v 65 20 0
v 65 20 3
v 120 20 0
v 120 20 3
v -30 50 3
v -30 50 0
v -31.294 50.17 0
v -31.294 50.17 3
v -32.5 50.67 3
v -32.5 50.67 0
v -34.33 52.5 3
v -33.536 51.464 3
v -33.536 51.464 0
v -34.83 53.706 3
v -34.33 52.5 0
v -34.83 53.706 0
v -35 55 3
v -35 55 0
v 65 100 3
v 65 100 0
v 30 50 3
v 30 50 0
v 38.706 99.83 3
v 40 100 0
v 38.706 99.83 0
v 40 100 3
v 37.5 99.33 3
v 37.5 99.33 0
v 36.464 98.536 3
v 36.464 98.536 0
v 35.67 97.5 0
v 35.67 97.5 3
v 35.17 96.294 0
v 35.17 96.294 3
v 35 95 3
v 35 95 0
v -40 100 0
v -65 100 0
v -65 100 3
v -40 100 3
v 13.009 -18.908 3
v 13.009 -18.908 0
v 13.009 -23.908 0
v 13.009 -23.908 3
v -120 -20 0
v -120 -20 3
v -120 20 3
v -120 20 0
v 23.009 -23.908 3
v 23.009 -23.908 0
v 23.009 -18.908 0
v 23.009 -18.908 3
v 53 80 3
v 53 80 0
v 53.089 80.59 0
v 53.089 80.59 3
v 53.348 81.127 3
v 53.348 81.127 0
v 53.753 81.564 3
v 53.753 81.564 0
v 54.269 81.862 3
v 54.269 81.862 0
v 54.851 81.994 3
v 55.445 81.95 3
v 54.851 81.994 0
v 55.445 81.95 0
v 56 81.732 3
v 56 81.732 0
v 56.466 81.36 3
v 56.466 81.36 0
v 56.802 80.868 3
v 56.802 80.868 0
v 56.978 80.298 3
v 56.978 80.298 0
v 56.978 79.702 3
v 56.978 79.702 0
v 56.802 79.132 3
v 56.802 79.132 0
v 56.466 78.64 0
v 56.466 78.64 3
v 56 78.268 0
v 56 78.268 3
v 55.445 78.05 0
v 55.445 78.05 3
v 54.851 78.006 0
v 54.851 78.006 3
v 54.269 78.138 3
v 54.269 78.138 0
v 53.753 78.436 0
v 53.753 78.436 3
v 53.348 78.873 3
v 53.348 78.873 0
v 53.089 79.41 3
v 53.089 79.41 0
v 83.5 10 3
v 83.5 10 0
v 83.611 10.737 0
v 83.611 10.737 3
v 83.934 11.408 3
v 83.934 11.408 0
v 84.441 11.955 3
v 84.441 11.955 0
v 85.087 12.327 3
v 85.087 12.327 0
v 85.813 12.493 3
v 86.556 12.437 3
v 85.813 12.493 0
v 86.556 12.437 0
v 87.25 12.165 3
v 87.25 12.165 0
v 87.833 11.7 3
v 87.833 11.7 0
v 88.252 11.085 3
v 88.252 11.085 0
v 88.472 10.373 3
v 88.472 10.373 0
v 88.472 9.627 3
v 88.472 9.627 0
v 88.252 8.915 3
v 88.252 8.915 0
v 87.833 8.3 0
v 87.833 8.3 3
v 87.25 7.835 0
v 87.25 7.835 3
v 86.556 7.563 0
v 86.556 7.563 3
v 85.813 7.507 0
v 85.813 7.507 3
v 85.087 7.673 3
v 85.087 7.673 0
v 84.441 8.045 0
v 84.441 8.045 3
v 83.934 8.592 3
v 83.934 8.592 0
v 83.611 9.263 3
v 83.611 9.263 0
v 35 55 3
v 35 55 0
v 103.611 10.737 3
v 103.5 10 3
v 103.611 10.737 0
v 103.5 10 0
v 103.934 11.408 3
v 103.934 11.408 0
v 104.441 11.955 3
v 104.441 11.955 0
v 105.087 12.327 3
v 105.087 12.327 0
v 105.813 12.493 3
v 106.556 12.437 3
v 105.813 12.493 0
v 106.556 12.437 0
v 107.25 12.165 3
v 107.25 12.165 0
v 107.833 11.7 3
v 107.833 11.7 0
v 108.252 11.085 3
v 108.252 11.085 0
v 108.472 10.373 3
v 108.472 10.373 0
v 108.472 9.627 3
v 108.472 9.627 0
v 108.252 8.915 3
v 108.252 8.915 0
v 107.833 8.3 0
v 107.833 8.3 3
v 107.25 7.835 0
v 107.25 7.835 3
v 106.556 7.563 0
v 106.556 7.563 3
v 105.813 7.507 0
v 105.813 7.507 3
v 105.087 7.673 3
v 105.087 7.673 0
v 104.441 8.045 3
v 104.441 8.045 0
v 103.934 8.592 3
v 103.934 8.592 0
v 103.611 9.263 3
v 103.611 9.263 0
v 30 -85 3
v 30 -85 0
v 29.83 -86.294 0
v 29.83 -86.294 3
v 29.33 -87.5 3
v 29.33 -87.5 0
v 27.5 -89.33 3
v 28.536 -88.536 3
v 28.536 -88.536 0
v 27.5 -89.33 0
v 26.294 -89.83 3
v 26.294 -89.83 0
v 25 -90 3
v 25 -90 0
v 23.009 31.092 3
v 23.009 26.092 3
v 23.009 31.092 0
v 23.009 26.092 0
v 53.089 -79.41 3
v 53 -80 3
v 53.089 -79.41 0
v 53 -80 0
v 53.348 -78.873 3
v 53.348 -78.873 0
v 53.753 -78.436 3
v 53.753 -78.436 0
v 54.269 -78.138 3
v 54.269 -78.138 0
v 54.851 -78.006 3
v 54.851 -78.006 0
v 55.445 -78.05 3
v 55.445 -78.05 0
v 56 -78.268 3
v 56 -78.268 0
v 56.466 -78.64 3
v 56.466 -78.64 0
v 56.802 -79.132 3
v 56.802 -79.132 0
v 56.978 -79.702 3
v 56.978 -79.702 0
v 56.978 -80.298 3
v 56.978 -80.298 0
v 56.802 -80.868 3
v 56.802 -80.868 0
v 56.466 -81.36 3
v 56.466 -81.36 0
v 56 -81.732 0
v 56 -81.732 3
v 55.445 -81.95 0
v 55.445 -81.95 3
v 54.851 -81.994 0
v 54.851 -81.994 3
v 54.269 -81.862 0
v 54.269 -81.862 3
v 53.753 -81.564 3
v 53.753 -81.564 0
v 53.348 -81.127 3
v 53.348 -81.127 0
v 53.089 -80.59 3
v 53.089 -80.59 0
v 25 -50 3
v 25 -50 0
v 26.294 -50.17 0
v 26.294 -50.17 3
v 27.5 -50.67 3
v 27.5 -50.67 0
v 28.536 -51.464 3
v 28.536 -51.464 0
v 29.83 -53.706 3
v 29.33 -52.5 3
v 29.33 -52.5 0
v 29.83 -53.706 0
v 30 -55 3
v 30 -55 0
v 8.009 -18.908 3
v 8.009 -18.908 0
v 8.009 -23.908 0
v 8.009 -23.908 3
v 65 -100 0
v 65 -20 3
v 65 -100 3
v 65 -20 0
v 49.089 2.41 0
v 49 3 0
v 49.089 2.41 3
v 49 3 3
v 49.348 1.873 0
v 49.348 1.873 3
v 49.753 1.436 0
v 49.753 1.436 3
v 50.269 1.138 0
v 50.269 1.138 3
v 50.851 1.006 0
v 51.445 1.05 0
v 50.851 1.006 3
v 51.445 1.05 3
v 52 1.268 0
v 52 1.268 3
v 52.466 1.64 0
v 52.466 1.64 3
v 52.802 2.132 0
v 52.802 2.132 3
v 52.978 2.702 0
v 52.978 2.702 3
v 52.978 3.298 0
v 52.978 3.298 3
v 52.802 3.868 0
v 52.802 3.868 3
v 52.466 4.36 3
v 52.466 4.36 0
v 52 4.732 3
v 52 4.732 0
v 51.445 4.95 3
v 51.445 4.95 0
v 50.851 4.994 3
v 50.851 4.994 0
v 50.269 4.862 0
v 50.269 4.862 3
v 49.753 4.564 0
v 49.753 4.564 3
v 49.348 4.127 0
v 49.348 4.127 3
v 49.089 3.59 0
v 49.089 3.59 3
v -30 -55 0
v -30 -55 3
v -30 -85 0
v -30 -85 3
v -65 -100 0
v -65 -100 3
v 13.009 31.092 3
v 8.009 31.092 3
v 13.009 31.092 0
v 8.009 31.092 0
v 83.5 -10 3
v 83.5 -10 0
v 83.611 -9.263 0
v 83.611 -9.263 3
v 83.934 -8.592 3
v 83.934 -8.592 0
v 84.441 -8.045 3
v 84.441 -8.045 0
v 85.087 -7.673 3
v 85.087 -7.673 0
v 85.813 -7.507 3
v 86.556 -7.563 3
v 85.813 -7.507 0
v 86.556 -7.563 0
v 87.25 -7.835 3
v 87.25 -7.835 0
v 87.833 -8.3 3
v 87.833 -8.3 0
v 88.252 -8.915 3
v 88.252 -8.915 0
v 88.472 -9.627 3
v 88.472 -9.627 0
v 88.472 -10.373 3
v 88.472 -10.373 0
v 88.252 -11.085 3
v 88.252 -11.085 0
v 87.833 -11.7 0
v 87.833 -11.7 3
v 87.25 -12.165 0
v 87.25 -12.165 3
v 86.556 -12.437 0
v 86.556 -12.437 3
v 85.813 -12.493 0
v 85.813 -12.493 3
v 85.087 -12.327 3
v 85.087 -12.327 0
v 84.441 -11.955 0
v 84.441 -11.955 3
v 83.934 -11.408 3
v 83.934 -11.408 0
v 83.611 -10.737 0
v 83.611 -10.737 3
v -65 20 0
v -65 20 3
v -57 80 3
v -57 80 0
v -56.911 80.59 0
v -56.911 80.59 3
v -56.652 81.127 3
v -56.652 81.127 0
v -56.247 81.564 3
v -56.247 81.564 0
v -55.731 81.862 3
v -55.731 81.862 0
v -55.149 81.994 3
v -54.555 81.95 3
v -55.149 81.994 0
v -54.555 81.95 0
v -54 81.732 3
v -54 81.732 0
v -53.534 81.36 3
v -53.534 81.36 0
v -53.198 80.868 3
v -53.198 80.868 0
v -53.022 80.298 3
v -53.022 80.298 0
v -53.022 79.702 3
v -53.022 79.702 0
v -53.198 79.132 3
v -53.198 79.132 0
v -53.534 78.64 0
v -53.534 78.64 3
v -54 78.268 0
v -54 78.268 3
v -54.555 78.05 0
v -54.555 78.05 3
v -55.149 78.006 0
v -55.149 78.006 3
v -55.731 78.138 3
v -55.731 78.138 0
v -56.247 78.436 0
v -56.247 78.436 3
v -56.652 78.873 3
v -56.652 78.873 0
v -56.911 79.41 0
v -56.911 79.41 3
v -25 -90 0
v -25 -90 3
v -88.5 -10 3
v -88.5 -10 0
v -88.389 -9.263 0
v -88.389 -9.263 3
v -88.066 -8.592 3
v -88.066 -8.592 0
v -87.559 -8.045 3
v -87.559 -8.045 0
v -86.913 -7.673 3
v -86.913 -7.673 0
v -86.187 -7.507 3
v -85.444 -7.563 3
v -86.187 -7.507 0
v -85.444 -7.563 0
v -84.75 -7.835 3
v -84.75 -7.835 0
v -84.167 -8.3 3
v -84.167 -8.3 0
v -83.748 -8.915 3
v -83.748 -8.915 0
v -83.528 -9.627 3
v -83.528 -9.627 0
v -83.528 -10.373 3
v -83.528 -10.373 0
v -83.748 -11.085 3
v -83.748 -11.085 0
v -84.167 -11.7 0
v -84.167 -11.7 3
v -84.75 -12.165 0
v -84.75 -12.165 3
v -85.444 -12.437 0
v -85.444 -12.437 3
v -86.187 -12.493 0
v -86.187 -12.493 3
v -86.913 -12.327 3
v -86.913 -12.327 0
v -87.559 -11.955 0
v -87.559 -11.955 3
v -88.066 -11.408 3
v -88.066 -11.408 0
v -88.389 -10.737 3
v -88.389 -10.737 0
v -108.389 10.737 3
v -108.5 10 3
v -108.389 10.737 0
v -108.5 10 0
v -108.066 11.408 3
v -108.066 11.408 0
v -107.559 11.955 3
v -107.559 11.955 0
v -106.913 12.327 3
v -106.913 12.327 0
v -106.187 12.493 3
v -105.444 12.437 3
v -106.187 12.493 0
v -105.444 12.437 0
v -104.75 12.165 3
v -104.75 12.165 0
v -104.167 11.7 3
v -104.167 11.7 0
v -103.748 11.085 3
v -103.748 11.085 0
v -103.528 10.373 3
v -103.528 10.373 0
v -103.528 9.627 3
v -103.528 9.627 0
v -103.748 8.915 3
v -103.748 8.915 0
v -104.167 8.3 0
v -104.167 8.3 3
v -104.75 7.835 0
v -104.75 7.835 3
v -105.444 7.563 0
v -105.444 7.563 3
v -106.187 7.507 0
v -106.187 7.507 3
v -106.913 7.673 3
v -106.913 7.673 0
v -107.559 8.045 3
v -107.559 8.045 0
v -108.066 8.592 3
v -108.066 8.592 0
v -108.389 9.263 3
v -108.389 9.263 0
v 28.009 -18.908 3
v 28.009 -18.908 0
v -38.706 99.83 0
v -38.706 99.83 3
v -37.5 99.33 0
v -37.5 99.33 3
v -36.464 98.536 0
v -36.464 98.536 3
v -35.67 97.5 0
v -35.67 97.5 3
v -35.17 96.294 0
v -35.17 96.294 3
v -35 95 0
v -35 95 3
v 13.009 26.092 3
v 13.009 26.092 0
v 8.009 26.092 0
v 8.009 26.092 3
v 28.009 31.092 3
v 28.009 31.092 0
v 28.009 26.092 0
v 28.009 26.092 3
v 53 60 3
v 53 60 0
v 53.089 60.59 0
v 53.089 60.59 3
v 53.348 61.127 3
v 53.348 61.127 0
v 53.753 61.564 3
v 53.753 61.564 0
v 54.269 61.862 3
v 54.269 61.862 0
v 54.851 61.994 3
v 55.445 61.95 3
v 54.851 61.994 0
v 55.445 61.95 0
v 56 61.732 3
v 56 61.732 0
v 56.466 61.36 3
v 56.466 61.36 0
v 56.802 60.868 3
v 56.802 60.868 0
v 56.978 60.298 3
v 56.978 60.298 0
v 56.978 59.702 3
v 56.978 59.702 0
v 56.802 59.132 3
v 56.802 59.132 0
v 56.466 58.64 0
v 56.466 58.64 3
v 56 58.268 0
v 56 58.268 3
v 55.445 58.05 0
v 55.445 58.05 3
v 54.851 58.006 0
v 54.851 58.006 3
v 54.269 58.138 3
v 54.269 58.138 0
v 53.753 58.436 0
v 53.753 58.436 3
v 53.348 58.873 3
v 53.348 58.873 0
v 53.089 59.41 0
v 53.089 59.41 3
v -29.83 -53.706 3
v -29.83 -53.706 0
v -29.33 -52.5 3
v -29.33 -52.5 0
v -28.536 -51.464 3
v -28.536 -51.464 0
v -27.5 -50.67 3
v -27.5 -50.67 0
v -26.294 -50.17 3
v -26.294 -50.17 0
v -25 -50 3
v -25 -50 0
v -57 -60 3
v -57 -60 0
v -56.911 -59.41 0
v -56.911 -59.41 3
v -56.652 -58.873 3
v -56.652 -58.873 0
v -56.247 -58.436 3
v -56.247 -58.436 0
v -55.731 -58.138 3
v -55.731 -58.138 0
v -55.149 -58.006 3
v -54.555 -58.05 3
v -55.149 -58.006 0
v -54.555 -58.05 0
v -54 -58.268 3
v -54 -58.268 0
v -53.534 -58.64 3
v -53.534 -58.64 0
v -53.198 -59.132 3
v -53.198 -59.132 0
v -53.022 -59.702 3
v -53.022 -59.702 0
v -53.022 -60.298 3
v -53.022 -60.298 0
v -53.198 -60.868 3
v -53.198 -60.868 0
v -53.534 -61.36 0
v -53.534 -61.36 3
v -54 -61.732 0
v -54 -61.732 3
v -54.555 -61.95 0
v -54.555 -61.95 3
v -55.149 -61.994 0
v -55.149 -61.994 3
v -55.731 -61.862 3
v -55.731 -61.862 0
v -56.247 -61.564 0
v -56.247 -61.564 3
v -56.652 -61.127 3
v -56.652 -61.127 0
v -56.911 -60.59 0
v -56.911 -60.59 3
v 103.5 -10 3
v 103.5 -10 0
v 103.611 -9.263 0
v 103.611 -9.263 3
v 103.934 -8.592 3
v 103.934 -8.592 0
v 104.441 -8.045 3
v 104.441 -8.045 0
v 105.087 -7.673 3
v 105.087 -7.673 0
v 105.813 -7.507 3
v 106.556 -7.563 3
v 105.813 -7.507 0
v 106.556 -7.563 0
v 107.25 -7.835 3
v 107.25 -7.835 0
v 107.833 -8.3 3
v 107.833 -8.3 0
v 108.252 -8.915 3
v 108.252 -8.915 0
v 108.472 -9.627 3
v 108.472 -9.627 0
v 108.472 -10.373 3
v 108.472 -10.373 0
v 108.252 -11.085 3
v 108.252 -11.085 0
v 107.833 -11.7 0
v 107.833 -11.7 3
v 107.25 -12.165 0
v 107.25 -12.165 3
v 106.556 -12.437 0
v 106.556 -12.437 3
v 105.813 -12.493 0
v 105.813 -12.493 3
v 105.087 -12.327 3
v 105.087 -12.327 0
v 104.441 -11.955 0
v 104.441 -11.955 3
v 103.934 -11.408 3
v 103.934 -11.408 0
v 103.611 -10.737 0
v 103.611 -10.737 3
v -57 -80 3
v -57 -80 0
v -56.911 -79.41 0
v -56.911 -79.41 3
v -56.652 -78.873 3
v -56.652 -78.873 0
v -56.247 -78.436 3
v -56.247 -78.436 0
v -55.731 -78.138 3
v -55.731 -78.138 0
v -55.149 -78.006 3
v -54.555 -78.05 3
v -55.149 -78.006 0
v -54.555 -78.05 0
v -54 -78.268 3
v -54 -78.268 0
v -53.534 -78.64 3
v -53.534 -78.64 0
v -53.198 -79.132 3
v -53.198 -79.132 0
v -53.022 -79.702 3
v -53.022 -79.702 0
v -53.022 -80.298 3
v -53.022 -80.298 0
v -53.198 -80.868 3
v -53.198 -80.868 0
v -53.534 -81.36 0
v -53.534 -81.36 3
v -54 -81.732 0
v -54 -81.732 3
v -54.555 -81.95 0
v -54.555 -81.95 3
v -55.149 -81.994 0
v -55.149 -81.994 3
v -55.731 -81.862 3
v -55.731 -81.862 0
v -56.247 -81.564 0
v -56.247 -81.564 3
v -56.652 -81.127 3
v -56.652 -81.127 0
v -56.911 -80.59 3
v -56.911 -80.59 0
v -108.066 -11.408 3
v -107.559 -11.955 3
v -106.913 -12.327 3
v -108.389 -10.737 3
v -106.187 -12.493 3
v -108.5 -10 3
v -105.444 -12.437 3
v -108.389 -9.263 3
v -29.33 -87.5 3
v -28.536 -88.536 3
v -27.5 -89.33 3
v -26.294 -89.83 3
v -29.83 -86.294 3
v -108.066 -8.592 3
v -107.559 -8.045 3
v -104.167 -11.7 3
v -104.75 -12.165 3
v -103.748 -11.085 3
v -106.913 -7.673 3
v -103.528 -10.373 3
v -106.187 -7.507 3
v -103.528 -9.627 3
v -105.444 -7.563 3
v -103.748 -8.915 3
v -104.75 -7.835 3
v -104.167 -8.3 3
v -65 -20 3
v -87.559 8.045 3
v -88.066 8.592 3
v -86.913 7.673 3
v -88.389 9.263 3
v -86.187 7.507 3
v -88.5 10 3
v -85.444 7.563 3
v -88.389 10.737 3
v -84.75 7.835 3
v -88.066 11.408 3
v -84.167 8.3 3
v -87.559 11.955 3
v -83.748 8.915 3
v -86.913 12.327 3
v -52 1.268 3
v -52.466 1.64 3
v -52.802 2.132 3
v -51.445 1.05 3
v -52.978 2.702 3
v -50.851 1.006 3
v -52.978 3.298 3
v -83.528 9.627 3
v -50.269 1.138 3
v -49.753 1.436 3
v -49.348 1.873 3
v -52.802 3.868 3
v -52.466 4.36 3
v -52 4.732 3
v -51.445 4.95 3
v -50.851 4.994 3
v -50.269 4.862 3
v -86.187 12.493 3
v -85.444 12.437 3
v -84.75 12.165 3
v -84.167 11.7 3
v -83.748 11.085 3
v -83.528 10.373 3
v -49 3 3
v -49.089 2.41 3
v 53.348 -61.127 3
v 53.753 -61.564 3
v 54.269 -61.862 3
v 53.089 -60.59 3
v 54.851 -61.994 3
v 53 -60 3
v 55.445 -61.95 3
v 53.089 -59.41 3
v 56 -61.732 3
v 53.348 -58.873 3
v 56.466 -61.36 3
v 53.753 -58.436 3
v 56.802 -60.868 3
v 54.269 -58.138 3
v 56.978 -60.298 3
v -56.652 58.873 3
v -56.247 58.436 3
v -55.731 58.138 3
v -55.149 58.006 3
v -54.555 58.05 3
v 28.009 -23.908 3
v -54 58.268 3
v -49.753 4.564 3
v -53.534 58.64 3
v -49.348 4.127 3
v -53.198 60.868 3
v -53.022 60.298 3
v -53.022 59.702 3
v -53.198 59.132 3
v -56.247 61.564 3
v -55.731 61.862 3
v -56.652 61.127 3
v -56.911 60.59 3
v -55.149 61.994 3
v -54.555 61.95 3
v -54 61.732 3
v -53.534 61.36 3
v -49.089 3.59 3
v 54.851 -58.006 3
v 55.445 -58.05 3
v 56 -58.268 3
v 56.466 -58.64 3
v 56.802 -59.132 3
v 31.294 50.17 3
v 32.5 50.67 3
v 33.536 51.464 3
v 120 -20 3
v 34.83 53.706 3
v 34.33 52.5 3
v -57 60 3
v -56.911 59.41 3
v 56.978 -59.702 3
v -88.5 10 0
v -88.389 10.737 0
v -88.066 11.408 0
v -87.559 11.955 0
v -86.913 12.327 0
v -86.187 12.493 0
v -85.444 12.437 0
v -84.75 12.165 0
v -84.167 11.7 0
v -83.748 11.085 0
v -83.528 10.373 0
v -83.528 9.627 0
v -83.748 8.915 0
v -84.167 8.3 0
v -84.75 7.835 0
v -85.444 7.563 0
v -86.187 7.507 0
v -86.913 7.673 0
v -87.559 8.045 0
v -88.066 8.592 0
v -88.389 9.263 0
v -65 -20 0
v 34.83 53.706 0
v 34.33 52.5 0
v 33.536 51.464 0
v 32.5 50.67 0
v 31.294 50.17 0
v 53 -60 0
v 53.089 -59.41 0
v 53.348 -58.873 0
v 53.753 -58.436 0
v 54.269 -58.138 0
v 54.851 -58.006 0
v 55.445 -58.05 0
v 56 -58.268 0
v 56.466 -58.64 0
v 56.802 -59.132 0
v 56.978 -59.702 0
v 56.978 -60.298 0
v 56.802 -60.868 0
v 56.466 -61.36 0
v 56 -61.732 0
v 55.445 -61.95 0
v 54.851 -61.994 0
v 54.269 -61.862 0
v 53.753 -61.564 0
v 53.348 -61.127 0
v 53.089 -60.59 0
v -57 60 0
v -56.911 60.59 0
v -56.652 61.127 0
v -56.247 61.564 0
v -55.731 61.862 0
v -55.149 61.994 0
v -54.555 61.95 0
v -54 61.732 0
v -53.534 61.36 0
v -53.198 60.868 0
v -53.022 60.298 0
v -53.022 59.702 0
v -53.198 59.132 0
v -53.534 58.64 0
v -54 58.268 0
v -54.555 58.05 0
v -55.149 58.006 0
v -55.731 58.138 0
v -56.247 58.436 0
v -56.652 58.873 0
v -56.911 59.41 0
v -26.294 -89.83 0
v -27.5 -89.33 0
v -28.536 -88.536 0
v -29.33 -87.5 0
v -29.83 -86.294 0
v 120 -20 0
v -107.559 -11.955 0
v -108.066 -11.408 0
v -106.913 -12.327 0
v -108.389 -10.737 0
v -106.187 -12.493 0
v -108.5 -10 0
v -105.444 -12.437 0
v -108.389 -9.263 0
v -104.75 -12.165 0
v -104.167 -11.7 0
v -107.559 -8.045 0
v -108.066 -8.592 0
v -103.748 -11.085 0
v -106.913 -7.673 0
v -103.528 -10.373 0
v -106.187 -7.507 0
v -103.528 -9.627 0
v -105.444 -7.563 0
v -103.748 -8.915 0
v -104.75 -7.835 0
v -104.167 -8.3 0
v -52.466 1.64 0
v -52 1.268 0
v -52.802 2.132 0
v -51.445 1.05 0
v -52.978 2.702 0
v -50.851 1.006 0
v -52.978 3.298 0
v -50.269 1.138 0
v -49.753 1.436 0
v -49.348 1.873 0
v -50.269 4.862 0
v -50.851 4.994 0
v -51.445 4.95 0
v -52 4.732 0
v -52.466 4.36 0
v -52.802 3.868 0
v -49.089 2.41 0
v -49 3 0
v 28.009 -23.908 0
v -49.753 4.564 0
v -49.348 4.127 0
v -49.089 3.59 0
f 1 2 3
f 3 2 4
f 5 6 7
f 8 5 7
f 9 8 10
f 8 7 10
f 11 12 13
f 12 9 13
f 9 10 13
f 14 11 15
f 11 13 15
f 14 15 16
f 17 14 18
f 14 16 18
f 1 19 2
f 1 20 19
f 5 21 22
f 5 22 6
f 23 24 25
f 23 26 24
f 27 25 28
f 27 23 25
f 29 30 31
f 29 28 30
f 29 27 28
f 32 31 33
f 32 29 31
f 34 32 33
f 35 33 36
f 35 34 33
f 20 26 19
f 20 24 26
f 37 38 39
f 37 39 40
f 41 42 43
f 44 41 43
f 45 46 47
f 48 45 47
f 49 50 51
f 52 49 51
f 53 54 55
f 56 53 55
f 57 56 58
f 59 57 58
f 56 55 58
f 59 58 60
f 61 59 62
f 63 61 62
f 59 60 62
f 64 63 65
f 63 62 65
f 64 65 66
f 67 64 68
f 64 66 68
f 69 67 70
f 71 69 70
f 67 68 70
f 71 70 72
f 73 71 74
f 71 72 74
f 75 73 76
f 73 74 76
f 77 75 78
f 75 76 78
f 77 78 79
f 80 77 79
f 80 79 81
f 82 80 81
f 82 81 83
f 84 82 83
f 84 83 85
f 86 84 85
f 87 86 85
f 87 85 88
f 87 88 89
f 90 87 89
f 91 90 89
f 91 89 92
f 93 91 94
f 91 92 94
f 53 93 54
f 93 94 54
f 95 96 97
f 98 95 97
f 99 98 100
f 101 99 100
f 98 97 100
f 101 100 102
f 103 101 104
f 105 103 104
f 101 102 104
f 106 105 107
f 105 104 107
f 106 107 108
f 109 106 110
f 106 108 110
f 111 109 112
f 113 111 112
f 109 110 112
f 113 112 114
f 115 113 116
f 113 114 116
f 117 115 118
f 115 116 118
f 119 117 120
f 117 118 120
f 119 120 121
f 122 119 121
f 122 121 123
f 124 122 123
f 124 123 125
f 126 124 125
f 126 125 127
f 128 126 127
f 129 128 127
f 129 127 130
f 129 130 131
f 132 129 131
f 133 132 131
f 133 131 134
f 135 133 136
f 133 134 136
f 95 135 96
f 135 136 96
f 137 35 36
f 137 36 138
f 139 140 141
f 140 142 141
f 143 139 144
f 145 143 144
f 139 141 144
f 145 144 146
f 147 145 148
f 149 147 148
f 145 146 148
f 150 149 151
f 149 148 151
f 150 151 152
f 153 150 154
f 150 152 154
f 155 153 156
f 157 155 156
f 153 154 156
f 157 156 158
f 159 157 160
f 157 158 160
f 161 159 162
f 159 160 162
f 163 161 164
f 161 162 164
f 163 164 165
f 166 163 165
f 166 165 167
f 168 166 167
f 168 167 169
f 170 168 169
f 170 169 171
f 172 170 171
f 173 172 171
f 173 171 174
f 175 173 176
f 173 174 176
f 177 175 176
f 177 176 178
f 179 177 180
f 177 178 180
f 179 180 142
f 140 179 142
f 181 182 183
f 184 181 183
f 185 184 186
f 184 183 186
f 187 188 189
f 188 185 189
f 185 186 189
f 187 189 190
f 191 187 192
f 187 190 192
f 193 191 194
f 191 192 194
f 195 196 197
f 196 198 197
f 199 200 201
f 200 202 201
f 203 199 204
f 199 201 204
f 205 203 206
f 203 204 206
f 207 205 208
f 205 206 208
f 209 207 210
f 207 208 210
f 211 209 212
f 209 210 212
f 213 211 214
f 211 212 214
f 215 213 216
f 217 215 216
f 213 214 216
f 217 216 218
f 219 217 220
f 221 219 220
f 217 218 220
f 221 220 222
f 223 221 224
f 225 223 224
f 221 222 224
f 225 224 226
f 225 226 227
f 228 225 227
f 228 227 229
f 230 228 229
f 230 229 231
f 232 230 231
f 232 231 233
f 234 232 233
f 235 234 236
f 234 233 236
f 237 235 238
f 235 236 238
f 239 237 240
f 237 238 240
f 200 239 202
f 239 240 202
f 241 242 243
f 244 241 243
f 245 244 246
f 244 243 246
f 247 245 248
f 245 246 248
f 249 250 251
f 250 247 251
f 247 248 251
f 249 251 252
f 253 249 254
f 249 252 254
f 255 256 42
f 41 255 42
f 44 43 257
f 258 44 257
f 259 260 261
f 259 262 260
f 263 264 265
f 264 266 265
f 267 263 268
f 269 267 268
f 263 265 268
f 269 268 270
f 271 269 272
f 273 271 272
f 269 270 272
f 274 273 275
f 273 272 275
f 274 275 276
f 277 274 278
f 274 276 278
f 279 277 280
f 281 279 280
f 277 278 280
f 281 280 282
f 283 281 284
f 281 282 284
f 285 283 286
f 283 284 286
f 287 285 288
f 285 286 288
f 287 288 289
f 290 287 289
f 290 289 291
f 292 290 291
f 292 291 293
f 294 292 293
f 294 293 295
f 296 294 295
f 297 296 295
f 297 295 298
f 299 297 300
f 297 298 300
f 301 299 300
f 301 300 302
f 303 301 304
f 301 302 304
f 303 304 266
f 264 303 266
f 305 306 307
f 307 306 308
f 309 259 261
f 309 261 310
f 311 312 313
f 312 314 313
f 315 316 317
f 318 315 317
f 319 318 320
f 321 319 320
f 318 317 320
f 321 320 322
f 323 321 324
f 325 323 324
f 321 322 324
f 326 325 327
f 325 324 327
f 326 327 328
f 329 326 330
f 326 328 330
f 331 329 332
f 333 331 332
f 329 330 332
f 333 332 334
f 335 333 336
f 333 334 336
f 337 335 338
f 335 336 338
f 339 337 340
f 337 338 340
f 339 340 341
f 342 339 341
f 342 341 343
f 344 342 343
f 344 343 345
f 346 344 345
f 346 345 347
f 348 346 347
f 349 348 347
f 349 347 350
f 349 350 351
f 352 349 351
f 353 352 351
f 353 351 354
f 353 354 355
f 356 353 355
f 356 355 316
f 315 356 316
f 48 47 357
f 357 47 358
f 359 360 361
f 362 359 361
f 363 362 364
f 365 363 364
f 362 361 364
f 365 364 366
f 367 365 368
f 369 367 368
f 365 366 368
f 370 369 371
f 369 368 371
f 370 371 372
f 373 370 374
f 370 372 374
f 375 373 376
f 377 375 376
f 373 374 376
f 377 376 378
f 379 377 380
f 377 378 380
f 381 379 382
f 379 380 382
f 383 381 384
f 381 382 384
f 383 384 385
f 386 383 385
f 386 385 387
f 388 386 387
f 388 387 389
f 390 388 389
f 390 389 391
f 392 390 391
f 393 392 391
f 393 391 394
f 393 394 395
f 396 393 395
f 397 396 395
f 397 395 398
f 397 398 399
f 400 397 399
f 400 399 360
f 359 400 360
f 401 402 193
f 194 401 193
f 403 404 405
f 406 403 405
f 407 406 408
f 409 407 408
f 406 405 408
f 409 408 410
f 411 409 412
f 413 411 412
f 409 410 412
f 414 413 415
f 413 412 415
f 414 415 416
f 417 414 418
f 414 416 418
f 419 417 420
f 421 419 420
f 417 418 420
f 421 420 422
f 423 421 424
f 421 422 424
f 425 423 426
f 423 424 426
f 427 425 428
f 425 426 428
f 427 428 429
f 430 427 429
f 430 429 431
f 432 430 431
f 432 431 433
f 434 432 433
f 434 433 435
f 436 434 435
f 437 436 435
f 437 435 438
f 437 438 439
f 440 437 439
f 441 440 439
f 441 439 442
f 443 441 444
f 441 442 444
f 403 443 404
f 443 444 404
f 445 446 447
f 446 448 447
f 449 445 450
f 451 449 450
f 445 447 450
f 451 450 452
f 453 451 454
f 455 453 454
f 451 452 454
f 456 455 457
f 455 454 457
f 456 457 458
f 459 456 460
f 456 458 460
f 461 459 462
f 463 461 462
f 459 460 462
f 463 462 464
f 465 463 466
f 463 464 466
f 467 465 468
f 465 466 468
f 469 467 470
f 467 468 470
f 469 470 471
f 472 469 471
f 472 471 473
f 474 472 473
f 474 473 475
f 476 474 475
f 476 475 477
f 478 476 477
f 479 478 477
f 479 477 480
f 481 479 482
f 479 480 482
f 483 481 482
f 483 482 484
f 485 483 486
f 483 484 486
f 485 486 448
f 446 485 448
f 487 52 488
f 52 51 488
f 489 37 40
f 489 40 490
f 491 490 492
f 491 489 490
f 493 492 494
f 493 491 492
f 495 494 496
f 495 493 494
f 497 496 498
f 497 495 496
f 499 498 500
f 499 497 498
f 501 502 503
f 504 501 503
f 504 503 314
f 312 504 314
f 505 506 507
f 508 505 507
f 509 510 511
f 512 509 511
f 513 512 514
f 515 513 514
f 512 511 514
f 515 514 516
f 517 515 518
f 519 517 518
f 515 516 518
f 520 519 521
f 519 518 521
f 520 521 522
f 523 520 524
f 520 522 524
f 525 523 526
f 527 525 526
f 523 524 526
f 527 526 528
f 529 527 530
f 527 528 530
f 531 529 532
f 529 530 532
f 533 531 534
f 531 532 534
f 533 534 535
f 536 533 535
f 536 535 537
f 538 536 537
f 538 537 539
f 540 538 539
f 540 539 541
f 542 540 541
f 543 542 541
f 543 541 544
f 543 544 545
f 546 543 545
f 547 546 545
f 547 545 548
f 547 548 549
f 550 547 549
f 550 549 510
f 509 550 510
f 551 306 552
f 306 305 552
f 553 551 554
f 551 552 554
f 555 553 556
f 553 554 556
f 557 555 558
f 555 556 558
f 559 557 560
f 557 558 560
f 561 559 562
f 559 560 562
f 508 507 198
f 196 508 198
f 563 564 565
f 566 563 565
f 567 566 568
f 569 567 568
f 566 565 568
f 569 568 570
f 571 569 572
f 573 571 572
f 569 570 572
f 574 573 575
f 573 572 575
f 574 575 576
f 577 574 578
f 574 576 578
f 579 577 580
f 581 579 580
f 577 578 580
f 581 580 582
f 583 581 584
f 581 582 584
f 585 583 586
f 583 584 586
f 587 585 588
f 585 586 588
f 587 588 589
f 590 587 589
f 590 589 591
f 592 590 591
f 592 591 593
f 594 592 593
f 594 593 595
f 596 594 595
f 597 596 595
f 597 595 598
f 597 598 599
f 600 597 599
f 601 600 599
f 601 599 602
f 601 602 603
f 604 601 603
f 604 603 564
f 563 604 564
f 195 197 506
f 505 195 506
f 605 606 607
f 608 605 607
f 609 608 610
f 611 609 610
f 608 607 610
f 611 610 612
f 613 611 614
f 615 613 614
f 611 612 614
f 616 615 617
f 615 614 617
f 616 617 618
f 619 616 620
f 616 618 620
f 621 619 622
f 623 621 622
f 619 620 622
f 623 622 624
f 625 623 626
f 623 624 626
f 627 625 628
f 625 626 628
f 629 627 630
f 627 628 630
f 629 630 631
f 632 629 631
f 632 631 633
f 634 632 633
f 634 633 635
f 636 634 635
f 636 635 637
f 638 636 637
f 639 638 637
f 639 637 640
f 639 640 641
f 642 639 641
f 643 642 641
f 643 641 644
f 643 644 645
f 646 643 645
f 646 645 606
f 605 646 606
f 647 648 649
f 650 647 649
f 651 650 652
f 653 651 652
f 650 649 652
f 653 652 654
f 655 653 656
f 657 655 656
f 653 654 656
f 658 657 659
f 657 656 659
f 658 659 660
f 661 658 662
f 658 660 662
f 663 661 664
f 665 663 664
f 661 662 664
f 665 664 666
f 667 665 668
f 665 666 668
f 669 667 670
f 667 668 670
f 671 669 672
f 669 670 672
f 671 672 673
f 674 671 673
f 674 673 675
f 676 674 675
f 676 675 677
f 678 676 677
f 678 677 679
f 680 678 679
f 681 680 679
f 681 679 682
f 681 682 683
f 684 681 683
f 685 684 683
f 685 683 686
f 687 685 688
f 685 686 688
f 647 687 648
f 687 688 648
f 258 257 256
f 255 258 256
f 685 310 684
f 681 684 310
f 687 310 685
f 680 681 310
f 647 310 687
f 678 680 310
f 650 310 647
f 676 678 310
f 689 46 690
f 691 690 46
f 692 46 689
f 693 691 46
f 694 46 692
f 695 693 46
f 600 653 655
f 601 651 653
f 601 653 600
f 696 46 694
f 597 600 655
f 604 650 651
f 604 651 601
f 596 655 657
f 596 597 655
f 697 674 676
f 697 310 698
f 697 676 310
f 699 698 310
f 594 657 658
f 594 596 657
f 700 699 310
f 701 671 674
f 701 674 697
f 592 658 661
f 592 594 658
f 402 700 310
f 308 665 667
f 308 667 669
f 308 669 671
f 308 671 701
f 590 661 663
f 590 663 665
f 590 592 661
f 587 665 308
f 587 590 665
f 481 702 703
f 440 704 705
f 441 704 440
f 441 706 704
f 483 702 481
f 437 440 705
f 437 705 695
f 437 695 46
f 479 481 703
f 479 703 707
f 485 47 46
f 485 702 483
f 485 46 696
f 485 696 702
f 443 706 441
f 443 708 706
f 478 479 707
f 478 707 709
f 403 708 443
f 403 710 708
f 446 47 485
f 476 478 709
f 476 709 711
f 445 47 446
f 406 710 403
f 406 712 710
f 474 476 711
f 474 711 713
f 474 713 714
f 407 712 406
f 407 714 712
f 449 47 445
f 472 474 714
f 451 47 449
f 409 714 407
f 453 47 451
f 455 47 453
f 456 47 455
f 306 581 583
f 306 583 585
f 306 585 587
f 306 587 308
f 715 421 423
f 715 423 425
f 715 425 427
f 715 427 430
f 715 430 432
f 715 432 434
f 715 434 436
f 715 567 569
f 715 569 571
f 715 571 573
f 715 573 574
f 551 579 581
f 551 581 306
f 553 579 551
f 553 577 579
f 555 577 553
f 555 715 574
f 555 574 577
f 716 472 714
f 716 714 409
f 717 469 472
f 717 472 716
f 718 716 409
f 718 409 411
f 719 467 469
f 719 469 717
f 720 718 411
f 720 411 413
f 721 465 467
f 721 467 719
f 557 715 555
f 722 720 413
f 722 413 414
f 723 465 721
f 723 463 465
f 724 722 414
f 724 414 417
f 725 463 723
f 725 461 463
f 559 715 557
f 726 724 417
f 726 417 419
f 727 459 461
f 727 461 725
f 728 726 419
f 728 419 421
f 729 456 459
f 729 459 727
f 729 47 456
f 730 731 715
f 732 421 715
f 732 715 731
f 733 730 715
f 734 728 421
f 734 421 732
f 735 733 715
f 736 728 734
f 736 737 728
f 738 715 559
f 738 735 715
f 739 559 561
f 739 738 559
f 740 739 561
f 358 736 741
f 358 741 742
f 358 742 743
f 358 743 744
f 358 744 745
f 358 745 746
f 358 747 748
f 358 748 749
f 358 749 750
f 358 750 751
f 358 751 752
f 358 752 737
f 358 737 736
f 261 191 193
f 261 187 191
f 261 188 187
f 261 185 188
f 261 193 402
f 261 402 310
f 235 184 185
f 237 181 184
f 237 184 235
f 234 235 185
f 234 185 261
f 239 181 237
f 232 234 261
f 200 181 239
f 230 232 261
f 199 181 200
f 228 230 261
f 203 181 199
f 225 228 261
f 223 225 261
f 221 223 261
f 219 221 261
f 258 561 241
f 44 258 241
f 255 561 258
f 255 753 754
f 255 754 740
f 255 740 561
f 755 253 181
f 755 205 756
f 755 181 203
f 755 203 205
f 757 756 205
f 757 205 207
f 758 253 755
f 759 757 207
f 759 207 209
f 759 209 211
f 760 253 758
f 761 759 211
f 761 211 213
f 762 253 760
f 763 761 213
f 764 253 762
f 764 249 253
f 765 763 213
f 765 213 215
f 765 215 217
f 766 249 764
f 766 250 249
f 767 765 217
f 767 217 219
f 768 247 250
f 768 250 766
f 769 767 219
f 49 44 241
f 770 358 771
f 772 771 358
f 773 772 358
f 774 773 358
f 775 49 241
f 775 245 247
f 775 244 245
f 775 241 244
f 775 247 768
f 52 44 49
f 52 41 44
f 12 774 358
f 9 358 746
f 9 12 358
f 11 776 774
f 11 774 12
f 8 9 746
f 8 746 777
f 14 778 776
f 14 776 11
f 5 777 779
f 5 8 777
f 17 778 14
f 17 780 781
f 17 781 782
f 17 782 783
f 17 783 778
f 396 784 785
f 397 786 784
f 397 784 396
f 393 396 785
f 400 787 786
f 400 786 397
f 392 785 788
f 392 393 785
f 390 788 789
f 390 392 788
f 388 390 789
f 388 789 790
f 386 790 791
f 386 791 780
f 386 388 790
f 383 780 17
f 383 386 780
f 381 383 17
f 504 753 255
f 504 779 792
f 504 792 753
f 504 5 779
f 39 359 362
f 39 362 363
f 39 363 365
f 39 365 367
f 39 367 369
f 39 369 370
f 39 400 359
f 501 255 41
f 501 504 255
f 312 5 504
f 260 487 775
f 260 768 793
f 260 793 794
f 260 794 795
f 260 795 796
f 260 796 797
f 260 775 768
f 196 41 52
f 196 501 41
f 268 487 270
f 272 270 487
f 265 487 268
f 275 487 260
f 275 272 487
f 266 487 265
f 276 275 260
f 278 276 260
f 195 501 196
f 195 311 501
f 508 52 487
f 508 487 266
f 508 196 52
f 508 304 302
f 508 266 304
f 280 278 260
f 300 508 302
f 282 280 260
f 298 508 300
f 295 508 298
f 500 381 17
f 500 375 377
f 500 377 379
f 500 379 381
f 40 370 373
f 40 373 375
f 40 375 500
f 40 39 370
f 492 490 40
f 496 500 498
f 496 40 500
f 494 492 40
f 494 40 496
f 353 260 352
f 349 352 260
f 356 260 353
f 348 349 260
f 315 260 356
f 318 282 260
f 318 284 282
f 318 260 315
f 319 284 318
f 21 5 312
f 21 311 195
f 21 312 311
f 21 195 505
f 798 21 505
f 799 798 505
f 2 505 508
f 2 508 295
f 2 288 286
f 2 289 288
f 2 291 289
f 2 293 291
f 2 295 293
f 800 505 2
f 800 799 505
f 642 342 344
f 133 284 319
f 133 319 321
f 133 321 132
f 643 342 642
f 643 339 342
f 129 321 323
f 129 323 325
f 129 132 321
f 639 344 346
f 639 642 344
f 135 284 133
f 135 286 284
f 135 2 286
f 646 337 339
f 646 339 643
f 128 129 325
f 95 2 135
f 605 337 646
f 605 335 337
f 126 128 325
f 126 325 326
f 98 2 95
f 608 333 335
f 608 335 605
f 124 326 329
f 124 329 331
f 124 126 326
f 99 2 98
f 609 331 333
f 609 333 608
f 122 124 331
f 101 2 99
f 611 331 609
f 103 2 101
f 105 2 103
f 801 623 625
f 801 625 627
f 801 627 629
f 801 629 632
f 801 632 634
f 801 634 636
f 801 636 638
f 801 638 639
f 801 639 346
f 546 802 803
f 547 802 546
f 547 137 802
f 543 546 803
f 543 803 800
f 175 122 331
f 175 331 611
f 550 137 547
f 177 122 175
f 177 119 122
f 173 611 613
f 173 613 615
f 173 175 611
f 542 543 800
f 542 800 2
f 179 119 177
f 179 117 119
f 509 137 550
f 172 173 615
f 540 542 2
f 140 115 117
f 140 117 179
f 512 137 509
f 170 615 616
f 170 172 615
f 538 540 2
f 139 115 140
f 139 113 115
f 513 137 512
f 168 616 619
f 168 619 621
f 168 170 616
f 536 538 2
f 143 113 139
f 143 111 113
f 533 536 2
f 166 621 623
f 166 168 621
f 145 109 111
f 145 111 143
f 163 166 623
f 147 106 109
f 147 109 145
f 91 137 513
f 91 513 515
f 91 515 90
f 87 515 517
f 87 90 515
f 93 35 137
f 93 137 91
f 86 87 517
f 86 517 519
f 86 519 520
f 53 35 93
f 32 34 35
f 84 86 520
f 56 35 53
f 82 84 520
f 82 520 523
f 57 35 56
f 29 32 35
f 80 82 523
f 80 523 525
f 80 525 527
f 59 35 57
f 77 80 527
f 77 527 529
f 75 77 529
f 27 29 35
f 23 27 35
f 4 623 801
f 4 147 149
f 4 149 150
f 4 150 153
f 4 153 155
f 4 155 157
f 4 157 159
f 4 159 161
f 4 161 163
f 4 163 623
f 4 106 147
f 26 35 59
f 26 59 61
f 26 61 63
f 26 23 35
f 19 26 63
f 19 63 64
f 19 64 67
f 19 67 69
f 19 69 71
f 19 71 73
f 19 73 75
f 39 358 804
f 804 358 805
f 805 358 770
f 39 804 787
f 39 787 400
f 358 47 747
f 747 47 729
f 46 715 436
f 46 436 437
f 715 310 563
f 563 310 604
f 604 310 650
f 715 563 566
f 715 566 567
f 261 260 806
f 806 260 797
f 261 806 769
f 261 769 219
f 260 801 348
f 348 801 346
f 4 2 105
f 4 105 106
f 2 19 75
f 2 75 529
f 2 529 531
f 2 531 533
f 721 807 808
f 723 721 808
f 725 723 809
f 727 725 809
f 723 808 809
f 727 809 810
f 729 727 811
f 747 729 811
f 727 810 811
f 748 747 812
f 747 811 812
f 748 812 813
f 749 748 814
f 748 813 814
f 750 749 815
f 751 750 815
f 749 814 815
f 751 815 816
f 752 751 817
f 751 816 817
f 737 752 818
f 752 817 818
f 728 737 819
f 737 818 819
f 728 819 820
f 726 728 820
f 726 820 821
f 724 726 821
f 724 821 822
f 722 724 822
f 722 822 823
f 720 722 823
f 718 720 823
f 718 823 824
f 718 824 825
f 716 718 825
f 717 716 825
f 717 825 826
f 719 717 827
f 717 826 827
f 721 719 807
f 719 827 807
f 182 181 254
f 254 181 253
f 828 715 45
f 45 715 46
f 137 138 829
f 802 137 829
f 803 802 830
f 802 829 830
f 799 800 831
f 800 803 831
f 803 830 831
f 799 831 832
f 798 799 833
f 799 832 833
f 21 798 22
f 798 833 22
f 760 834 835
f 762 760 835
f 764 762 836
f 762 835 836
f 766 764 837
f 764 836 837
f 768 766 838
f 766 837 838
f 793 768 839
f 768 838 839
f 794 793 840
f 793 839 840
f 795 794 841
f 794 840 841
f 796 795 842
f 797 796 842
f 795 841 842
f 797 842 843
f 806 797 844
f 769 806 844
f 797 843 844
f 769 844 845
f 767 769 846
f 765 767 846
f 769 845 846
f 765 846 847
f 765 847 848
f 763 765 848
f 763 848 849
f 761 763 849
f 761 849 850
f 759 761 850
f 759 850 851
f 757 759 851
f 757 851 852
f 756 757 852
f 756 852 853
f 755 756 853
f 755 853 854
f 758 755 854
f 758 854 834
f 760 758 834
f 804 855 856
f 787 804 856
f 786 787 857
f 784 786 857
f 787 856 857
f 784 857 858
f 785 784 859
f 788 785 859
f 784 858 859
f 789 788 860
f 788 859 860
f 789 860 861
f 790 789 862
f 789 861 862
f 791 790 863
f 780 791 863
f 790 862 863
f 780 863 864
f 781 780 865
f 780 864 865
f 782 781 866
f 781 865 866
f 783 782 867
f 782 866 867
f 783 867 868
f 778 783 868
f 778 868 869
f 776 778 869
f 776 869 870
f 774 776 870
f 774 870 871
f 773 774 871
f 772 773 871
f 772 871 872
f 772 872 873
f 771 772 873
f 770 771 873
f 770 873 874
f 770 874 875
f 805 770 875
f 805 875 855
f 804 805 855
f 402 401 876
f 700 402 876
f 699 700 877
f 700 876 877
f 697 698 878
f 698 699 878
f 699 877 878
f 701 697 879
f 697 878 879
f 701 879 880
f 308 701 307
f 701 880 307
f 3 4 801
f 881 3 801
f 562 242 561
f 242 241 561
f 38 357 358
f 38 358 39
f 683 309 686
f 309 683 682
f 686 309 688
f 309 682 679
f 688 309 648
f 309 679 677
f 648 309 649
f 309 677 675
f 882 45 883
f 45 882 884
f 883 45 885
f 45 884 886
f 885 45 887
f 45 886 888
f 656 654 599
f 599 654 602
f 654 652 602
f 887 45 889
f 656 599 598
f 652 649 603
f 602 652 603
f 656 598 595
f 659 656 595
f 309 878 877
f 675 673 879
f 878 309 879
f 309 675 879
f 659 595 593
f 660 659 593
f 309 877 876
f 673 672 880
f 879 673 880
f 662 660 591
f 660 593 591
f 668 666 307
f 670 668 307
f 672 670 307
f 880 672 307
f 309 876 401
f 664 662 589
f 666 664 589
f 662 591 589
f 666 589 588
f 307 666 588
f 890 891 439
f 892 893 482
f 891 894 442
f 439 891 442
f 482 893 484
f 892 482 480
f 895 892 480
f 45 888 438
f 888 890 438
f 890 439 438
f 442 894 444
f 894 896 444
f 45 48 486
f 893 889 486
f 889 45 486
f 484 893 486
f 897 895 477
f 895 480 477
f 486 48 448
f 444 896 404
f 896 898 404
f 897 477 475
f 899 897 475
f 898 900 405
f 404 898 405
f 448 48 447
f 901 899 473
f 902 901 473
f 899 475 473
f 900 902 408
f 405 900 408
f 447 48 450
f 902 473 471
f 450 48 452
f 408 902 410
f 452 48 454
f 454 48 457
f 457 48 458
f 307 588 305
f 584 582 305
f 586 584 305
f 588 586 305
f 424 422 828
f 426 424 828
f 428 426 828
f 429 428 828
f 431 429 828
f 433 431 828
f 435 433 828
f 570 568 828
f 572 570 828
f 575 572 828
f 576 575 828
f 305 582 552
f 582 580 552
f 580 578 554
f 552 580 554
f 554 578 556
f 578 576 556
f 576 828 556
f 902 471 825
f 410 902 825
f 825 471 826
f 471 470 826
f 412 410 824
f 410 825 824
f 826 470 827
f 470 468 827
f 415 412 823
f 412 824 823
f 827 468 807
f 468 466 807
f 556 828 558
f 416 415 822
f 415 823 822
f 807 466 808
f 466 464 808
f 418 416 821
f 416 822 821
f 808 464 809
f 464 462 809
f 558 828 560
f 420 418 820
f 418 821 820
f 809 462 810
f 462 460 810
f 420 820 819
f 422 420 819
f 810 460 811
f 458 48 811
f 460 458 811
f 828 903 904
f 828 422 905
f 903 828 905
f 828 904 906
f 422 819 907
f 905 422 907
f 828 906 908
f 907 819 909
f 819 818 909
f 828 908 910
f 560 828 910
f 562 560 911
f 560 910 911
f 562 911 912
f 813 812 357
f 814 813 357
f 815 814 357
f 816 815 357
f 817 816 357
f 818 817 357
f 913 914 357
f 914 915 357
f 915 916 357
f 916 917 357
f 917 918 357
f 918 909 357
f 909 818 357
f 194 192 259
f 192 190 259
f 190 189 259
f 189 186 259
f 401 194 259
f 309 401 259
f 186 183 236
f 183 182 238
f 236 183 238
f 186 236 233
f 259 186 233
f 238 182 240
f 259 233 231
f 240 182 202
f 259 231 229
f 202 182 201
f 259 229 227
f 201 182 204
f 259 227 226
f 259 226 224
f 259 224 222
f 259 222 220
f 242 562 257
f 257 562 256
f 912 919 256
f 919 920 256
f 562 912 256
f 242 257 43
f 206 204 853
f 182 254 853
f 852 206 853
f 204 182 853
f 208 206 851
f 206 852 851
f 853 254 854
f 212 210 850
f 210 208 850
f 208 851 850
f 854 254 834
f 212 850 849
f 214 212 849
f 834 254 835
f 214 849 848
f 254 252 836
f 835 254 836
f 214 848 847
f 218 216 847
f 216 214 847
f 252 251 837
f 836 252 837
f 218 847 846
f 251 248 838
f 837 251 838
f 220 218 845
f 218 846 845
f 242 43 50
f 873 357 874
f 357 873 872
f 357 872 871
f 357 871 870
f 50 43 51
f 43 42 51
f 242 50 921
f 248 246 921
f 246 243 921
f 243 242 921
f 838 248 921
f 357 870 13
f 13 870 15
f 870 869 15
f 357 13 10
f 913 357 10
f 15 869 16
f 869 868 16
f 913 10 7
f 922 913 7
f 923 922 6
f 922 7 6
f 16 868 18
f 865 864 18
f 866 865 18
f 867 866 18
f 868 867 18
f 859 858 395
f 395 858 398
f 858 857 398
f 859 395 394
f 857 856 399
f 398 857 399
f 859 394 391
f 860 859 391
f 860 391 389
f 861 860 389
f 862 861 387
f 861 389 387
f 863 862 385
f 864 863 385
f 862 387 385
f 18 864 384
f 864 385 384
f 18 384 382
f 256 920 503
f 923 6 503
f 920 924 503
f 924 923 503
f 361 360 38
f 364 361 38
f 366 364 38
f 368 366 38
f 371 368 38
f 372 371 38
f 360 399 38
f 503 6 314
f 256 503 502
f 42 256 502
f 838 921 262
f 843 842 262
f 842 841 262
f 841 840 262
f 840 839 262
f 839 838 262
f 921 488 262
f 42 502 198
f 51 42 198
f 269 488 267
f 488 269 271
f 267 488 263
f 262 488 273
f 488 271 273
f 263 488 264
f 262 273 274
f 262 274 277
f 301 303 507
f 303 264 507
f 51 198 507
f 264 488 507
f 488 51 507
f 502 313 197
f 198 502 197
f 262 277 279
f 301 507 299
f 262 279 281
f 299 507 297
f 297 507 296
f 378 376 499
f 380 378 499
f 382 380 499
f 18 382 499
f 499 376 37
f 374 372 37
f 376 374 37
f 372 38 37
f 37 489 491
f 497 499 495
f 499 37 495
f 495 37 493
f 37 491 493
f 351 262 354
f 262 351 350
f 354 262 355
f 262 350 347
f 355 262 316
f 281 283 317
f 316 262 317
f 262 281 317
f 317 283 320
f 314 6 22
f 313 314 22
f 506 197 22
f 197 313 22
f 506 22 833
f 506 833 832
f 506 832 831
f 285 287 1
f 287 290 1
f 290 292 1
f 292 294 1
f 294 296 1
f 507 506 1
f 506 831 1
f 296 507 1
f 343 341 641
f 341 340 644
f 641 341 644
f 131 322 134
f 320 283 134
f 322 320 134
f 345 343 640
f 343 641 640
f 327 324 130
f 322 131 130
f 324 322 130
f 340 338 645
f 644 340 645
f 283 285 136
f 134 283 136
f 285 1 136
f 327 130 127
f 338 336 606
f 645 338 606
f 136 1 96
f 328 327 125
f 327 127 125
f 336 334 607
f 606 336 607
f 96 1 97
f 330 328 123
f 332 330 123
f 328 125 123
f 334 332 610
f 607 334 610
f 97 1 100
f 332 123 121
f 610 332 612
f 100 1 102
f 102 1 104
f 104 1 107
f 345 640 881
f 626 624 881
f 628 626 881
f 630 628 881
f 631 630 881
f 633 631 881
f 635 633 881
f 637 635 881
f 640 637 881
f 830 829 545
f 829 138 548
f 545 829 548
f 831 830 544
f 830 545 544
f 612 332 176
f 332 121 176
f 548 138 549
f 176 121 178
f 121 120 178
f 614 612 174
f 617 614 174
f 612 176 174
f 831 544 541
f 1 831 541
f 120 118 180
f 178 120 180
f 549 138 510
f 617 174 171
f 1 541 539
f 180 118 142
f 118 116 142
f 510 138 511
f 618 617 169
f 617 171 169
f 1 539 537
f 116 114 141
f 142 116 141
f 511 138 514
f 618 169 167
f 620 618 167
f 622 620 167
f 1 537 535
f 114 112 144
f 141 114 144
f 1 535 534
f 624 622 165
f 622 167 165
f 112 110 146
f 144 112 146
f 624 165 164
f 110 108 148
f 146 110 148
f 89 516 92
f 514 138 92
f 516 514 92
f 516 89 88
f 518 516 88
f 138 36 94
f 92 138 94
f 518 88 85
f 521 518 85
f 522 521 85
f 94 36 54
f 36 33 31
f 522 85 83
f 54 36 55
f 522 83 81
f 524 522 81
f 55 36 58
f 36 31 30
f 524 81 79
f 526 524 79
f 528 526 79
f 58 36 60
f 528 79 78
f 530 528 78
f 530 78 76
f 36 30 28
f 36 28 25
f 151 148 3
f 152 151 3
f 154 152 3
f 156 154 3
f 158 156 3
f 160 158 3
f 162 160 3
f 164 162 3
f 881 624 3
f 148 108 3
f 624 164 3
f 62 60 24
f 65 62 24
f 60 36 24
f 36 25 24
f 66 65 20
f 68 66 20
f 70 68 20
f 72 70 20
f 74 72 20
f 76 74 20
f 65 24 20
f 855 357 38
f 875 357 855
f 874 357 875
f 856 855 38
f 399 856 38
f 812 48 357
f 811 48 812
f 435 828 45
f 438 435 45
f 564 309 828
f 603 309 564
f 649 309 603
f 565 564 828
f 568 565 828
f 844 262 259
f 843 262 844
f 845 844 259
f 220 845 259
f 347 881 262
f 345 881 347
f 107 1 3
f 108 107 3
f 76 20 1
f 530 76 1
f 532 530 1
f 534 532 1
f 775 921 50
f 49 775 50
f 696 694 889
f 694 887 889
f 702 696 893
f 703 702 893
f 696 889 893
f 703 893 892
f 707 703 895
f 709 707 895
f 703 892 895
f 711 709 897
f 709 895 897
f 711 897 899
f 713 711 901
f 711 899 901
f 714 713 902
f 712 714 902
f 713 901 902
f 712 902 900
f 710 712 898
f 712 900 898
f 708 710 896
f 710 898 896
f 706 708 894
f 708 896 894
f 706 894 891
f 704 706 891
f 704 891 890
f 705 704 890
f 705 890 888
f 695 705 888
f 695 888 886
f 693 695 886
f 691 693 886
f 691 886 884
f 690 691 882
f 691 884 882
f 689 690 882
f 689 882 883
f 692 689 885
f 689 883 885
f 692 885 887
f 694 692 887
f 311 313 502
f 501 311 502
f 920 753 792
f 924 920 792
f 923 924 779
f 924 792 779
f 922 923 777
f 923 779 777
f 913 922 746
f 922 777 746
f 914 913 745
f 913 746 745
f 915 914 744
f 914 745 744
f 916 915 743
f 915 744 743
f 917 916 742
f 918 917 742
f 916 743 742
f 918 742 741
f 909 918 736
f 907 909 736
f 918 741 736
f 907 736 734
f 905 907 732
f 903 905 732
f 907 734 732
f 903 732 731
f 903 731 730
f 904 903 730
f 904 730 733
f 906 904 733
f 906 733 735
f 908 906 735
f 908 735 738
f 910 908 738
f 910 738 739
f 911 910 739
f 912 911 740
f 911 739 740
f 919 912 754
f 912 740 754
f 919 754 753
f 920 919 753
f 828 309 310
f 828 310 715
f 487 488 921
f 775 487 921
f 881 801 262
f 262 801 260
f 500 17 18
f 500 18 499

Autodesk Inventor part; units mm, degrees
ref_plane "YZ Plane" through (0, 0, 0) normal (1, 0, 0) x (0, 1, 0)
ref_plane "XZ Plane" through (0, 0, 0) normal (0, 1, 0) x (-1, 0, 0)
ref_plane "XY Plane" through (0, 0, 0) normal (0, 0, 1) x (1, 0, 0)
sketch "草图1" plane through (0, 0, 0) normal (0, 0, 1) x (1, 0, 0)
  line L0 (65, -100) -> (-65, -100)
  line L1 (-65, -100) -> (-65, 100)
  line L2 (-65, 100) -> (65, 100)
  line L3 (65, 100) -> (65, -100)
  line L4 (65, -100) -> (-65, 100) construction
  line L5 (-65, -100) -> (65, 100) construction
  point P0 (0, 0)
  dimension "d0" = 130
  dimension "d1" = 200
extrude "拉伸1" add sketch "草图1" along normal blind 3
sketch "草图2" plane through (0, 0, 3) normal (0, 0, 1) x (1, 0, 0)
  line L0 (120, -20) -> (-120, -20)
  line L1 (-120, -20) -> (-120, 20)
  line L2 (-120, 20) -> (120, 20)
  line L3 (120, 20) -> (120, -20)
  line L4 (120, -20) -> (-120, 20) construction
  line L5 (-120, -20) -> (120, 20) construction
  line L6 (-65, 100) -> (-65, -100) projected
  point P0 (0, 0)
  dimension "d4" = 40
  dimension "d5" = 55
extrude "拉伸2" add sketch "草图2" against normal up to surface (3 mm away)
sketch "草图3" plane through (0, 0, 0) normal (0, 0, -1) x (-1, 0, 0)
  line L0 (120, -20) -> (120, 20) projected
  line L1 (120, 0) -> (-120, 0)
  line L2 (-120, -20) -> (-120, 20) projected
  line L3 (71, 49.9947) -> (71, -50.0053) projected
  line L4 (65, -100) -> (-65, -100) projected
  line L5 (0, -100) -> (0, 7.1575)
  circle A0 centre (86, -10) radius 2.5
  circle A1 centre (106, -10) radius 2.5
  line L6 (65, -20) -> (120, -20) projected
  circle A2 centre (86, 10) radius 2.5
  circle A3 centre (106, 10) radius 2.5
  circle A4 centre (-86, -10) radius 2.5
  circle A5 centre (-106, -10) radius 2.5
  circle A6 centre (-86, 10) radius 2.5
  circle A7 centre (-106, 10) radius 2.5
  point P0 (0, 0)
  dimension "d12" = 5
  dimension "d13" = 5
  dimension "d14" = 20
  dimension "d15" = 10
  dimension "d16" = 15
extrude "拉伸3" cut sketch "草图3" against normal blind 10 contours A0 | A1 | A2 | A3 | A4 | A5 | A6 | A7
sketch "草图4" plane through (0, 0, 3) normal (0, 0, 1) x (1, 0, 0)
  line L0 (-30, -90) -> (30, -90)
  line L1 (30, -90) -> (30, -50)
  line L2 (30, -50) -> (-30, -50)
  line L3 (-30, -50) -> (-30, -90)
  line L4 (-30, -90) -> (30, -50) construction
  line L5 (30, -90) -> (-30, -50) construction
  line L6 (-65, -100) -> (65, -100) projected
  point P0 (0, 0)
  point P1 (0, -70)
  dimension "d17" = 10
  dimension "d18" = 60
  dimension "d19" = 40
extrude "拉伸4" cut sketch "草图4" against normal blind 10
fillet "圆角1" radius 5 4 edges at (30, -90, 1.5) (30, -50, 1.5) (-30, -50, 1.5) (-30, -90, 1.5)
sketch "草图5" plane through (0, 0, 3) normal (0, 0, 1) x (1, 0, 0)
  line L0 (-35, 150) -> (35, 150)
  line L1 (35, 150) -> (35, 50)
  line L2 (35, 50) -> (-35, 50)
  line L3 (-35, 50) -> (-35, 150)
  line L4 (65, 100) -> (-65, 100) projected
  line L5 (-35, 150) -> (35, 50) construction
  line L6 (35, 150) -> (-35, 50) construction
  point P0 (0, 0)
  point P1 (0, 100)
  dimension "d23" = 50
  dimension "d24" = 70
extrude "拉伸5" cut sketch "草图5" against normal blind 10
fillet "圆角2" radius 5 4 edges at (35, 100, 1.5) (35, 50, 1.5) (-35, 50, 1.5) (-35, 100, 1.5)
sketch "草图6" plane through (0, 0, 3) normal (0, 0, 1) x (1, 0, 0)
  line L0 (-120, -20) -> (-120, 20) projected
  line L1 (-120, 3) -> (120, 3)
  line L2 (120, -20) -> (120, 20) projected
  line L3 (-120, 20) -> (-120, -20) projected
  line L4 (-120, -20) -> (-65, -20) projected
  line L5 (-51, -94.6609) -> (-51, 98.803)
  line L6 (-65, -20) -> (-65, -100) projected
  circle A0 centre (-51, 3) radius 2
  point P0 (0, 0)
  dimension "d28" = 23
  dimension "d29" = 14
  dimension "d30" = 4
extrude "拉伸6" cut sketch "草图6" against normal blind 10
ref_plane "工作平面1" through (0, -100, 0) normal (-1, 0, 0) x (0, 0, 1)
mirror "镜像1" about plane through (0, -100, 0) normal (-1, 0, 0) of "拉伸6"
sketch "草图7" plane through (0, 0, 0) normal (0, 0, -1) x (-1, 0, 0)
  line L0 (-8.0092, 31.0916) -> (-13.0092, 31.0916)
  line L1 (-13.0092, 31.0916) -> (-13.0092, 26.0916)
  line L2 (-13.0092, 26.0916) -> (-8.0092, 26.0916)
  line L3 (-8.0092, 26.0916) -> (-8.0092, 31.0916)
  line L4 (-23.0092, 31.0916) -> (-28.0092, 31.0916)
  line L5 (-28.0092, 31.0916) -> (-28.0092, 26.0916)
  line L6 (-28.0092, 26.0916) -> (-23.0092, 26.0916)
  line L7 (-23.0092, 26.0916) -> (-23.0092, 31.0916)
  point P0 (0, 0)
  point P1 (-23.0092, 28.5916)
  point P2 (-13.0092, 28.5916)
  dimension "d33" = 5
  dimension "d34" = 5
  dimension "d35" = 5
  dimension "d36" = 5
  dimension "d37" = 10
extrude "拉伸7" cut sketch "草图7" against normal blind 10
pattern_linear "矩形阵列1" count 2 spacing 50 along (0, -1, 0) of "拉伸7"
sketch "草图8" plane through (0, 0, 0) normal (0, 0, -1) x (-1, 0, 0)
  circle A0 centre (-55, -60) radius 2
  line L0 (65, -100) -> (-65, -100) projected
  line L1 (-65, -100) -> (-65, -20) projected
  circle A1 centre (-55, -80) radius 2
  line L2 (-55, -100) -> (-55, -60)
  line L3 (0, 0) -> (-45.6081, 0)
  line L4 (0, 0) -> (0, -68.1904)
  circle A2 centre (55, -60) radius 2
  line L5 (65, -100) -> (65, -20)
  circle A3 centre (55, -80) radius 2
  circle A4 centre (-55, 60) radius 2
  circle A5 centre (-55, 80) radius 2
  circle A6 centre (55, 60) radius 2
  circle A7 centre (55, 80) radius 2
  point P0 (-65, 100)
  point P1 (-55, 100)
  point P2 (0, 68.1904)
  dimension "d43" = 40
  dimension "d45" = 4
  dimension "d46" = 10
  dimension "d47" = 4
  dimension "d48" = 20
extrude "拉伸8" cut sketch "草图8" against normal blind 10
properties part number "板子"
